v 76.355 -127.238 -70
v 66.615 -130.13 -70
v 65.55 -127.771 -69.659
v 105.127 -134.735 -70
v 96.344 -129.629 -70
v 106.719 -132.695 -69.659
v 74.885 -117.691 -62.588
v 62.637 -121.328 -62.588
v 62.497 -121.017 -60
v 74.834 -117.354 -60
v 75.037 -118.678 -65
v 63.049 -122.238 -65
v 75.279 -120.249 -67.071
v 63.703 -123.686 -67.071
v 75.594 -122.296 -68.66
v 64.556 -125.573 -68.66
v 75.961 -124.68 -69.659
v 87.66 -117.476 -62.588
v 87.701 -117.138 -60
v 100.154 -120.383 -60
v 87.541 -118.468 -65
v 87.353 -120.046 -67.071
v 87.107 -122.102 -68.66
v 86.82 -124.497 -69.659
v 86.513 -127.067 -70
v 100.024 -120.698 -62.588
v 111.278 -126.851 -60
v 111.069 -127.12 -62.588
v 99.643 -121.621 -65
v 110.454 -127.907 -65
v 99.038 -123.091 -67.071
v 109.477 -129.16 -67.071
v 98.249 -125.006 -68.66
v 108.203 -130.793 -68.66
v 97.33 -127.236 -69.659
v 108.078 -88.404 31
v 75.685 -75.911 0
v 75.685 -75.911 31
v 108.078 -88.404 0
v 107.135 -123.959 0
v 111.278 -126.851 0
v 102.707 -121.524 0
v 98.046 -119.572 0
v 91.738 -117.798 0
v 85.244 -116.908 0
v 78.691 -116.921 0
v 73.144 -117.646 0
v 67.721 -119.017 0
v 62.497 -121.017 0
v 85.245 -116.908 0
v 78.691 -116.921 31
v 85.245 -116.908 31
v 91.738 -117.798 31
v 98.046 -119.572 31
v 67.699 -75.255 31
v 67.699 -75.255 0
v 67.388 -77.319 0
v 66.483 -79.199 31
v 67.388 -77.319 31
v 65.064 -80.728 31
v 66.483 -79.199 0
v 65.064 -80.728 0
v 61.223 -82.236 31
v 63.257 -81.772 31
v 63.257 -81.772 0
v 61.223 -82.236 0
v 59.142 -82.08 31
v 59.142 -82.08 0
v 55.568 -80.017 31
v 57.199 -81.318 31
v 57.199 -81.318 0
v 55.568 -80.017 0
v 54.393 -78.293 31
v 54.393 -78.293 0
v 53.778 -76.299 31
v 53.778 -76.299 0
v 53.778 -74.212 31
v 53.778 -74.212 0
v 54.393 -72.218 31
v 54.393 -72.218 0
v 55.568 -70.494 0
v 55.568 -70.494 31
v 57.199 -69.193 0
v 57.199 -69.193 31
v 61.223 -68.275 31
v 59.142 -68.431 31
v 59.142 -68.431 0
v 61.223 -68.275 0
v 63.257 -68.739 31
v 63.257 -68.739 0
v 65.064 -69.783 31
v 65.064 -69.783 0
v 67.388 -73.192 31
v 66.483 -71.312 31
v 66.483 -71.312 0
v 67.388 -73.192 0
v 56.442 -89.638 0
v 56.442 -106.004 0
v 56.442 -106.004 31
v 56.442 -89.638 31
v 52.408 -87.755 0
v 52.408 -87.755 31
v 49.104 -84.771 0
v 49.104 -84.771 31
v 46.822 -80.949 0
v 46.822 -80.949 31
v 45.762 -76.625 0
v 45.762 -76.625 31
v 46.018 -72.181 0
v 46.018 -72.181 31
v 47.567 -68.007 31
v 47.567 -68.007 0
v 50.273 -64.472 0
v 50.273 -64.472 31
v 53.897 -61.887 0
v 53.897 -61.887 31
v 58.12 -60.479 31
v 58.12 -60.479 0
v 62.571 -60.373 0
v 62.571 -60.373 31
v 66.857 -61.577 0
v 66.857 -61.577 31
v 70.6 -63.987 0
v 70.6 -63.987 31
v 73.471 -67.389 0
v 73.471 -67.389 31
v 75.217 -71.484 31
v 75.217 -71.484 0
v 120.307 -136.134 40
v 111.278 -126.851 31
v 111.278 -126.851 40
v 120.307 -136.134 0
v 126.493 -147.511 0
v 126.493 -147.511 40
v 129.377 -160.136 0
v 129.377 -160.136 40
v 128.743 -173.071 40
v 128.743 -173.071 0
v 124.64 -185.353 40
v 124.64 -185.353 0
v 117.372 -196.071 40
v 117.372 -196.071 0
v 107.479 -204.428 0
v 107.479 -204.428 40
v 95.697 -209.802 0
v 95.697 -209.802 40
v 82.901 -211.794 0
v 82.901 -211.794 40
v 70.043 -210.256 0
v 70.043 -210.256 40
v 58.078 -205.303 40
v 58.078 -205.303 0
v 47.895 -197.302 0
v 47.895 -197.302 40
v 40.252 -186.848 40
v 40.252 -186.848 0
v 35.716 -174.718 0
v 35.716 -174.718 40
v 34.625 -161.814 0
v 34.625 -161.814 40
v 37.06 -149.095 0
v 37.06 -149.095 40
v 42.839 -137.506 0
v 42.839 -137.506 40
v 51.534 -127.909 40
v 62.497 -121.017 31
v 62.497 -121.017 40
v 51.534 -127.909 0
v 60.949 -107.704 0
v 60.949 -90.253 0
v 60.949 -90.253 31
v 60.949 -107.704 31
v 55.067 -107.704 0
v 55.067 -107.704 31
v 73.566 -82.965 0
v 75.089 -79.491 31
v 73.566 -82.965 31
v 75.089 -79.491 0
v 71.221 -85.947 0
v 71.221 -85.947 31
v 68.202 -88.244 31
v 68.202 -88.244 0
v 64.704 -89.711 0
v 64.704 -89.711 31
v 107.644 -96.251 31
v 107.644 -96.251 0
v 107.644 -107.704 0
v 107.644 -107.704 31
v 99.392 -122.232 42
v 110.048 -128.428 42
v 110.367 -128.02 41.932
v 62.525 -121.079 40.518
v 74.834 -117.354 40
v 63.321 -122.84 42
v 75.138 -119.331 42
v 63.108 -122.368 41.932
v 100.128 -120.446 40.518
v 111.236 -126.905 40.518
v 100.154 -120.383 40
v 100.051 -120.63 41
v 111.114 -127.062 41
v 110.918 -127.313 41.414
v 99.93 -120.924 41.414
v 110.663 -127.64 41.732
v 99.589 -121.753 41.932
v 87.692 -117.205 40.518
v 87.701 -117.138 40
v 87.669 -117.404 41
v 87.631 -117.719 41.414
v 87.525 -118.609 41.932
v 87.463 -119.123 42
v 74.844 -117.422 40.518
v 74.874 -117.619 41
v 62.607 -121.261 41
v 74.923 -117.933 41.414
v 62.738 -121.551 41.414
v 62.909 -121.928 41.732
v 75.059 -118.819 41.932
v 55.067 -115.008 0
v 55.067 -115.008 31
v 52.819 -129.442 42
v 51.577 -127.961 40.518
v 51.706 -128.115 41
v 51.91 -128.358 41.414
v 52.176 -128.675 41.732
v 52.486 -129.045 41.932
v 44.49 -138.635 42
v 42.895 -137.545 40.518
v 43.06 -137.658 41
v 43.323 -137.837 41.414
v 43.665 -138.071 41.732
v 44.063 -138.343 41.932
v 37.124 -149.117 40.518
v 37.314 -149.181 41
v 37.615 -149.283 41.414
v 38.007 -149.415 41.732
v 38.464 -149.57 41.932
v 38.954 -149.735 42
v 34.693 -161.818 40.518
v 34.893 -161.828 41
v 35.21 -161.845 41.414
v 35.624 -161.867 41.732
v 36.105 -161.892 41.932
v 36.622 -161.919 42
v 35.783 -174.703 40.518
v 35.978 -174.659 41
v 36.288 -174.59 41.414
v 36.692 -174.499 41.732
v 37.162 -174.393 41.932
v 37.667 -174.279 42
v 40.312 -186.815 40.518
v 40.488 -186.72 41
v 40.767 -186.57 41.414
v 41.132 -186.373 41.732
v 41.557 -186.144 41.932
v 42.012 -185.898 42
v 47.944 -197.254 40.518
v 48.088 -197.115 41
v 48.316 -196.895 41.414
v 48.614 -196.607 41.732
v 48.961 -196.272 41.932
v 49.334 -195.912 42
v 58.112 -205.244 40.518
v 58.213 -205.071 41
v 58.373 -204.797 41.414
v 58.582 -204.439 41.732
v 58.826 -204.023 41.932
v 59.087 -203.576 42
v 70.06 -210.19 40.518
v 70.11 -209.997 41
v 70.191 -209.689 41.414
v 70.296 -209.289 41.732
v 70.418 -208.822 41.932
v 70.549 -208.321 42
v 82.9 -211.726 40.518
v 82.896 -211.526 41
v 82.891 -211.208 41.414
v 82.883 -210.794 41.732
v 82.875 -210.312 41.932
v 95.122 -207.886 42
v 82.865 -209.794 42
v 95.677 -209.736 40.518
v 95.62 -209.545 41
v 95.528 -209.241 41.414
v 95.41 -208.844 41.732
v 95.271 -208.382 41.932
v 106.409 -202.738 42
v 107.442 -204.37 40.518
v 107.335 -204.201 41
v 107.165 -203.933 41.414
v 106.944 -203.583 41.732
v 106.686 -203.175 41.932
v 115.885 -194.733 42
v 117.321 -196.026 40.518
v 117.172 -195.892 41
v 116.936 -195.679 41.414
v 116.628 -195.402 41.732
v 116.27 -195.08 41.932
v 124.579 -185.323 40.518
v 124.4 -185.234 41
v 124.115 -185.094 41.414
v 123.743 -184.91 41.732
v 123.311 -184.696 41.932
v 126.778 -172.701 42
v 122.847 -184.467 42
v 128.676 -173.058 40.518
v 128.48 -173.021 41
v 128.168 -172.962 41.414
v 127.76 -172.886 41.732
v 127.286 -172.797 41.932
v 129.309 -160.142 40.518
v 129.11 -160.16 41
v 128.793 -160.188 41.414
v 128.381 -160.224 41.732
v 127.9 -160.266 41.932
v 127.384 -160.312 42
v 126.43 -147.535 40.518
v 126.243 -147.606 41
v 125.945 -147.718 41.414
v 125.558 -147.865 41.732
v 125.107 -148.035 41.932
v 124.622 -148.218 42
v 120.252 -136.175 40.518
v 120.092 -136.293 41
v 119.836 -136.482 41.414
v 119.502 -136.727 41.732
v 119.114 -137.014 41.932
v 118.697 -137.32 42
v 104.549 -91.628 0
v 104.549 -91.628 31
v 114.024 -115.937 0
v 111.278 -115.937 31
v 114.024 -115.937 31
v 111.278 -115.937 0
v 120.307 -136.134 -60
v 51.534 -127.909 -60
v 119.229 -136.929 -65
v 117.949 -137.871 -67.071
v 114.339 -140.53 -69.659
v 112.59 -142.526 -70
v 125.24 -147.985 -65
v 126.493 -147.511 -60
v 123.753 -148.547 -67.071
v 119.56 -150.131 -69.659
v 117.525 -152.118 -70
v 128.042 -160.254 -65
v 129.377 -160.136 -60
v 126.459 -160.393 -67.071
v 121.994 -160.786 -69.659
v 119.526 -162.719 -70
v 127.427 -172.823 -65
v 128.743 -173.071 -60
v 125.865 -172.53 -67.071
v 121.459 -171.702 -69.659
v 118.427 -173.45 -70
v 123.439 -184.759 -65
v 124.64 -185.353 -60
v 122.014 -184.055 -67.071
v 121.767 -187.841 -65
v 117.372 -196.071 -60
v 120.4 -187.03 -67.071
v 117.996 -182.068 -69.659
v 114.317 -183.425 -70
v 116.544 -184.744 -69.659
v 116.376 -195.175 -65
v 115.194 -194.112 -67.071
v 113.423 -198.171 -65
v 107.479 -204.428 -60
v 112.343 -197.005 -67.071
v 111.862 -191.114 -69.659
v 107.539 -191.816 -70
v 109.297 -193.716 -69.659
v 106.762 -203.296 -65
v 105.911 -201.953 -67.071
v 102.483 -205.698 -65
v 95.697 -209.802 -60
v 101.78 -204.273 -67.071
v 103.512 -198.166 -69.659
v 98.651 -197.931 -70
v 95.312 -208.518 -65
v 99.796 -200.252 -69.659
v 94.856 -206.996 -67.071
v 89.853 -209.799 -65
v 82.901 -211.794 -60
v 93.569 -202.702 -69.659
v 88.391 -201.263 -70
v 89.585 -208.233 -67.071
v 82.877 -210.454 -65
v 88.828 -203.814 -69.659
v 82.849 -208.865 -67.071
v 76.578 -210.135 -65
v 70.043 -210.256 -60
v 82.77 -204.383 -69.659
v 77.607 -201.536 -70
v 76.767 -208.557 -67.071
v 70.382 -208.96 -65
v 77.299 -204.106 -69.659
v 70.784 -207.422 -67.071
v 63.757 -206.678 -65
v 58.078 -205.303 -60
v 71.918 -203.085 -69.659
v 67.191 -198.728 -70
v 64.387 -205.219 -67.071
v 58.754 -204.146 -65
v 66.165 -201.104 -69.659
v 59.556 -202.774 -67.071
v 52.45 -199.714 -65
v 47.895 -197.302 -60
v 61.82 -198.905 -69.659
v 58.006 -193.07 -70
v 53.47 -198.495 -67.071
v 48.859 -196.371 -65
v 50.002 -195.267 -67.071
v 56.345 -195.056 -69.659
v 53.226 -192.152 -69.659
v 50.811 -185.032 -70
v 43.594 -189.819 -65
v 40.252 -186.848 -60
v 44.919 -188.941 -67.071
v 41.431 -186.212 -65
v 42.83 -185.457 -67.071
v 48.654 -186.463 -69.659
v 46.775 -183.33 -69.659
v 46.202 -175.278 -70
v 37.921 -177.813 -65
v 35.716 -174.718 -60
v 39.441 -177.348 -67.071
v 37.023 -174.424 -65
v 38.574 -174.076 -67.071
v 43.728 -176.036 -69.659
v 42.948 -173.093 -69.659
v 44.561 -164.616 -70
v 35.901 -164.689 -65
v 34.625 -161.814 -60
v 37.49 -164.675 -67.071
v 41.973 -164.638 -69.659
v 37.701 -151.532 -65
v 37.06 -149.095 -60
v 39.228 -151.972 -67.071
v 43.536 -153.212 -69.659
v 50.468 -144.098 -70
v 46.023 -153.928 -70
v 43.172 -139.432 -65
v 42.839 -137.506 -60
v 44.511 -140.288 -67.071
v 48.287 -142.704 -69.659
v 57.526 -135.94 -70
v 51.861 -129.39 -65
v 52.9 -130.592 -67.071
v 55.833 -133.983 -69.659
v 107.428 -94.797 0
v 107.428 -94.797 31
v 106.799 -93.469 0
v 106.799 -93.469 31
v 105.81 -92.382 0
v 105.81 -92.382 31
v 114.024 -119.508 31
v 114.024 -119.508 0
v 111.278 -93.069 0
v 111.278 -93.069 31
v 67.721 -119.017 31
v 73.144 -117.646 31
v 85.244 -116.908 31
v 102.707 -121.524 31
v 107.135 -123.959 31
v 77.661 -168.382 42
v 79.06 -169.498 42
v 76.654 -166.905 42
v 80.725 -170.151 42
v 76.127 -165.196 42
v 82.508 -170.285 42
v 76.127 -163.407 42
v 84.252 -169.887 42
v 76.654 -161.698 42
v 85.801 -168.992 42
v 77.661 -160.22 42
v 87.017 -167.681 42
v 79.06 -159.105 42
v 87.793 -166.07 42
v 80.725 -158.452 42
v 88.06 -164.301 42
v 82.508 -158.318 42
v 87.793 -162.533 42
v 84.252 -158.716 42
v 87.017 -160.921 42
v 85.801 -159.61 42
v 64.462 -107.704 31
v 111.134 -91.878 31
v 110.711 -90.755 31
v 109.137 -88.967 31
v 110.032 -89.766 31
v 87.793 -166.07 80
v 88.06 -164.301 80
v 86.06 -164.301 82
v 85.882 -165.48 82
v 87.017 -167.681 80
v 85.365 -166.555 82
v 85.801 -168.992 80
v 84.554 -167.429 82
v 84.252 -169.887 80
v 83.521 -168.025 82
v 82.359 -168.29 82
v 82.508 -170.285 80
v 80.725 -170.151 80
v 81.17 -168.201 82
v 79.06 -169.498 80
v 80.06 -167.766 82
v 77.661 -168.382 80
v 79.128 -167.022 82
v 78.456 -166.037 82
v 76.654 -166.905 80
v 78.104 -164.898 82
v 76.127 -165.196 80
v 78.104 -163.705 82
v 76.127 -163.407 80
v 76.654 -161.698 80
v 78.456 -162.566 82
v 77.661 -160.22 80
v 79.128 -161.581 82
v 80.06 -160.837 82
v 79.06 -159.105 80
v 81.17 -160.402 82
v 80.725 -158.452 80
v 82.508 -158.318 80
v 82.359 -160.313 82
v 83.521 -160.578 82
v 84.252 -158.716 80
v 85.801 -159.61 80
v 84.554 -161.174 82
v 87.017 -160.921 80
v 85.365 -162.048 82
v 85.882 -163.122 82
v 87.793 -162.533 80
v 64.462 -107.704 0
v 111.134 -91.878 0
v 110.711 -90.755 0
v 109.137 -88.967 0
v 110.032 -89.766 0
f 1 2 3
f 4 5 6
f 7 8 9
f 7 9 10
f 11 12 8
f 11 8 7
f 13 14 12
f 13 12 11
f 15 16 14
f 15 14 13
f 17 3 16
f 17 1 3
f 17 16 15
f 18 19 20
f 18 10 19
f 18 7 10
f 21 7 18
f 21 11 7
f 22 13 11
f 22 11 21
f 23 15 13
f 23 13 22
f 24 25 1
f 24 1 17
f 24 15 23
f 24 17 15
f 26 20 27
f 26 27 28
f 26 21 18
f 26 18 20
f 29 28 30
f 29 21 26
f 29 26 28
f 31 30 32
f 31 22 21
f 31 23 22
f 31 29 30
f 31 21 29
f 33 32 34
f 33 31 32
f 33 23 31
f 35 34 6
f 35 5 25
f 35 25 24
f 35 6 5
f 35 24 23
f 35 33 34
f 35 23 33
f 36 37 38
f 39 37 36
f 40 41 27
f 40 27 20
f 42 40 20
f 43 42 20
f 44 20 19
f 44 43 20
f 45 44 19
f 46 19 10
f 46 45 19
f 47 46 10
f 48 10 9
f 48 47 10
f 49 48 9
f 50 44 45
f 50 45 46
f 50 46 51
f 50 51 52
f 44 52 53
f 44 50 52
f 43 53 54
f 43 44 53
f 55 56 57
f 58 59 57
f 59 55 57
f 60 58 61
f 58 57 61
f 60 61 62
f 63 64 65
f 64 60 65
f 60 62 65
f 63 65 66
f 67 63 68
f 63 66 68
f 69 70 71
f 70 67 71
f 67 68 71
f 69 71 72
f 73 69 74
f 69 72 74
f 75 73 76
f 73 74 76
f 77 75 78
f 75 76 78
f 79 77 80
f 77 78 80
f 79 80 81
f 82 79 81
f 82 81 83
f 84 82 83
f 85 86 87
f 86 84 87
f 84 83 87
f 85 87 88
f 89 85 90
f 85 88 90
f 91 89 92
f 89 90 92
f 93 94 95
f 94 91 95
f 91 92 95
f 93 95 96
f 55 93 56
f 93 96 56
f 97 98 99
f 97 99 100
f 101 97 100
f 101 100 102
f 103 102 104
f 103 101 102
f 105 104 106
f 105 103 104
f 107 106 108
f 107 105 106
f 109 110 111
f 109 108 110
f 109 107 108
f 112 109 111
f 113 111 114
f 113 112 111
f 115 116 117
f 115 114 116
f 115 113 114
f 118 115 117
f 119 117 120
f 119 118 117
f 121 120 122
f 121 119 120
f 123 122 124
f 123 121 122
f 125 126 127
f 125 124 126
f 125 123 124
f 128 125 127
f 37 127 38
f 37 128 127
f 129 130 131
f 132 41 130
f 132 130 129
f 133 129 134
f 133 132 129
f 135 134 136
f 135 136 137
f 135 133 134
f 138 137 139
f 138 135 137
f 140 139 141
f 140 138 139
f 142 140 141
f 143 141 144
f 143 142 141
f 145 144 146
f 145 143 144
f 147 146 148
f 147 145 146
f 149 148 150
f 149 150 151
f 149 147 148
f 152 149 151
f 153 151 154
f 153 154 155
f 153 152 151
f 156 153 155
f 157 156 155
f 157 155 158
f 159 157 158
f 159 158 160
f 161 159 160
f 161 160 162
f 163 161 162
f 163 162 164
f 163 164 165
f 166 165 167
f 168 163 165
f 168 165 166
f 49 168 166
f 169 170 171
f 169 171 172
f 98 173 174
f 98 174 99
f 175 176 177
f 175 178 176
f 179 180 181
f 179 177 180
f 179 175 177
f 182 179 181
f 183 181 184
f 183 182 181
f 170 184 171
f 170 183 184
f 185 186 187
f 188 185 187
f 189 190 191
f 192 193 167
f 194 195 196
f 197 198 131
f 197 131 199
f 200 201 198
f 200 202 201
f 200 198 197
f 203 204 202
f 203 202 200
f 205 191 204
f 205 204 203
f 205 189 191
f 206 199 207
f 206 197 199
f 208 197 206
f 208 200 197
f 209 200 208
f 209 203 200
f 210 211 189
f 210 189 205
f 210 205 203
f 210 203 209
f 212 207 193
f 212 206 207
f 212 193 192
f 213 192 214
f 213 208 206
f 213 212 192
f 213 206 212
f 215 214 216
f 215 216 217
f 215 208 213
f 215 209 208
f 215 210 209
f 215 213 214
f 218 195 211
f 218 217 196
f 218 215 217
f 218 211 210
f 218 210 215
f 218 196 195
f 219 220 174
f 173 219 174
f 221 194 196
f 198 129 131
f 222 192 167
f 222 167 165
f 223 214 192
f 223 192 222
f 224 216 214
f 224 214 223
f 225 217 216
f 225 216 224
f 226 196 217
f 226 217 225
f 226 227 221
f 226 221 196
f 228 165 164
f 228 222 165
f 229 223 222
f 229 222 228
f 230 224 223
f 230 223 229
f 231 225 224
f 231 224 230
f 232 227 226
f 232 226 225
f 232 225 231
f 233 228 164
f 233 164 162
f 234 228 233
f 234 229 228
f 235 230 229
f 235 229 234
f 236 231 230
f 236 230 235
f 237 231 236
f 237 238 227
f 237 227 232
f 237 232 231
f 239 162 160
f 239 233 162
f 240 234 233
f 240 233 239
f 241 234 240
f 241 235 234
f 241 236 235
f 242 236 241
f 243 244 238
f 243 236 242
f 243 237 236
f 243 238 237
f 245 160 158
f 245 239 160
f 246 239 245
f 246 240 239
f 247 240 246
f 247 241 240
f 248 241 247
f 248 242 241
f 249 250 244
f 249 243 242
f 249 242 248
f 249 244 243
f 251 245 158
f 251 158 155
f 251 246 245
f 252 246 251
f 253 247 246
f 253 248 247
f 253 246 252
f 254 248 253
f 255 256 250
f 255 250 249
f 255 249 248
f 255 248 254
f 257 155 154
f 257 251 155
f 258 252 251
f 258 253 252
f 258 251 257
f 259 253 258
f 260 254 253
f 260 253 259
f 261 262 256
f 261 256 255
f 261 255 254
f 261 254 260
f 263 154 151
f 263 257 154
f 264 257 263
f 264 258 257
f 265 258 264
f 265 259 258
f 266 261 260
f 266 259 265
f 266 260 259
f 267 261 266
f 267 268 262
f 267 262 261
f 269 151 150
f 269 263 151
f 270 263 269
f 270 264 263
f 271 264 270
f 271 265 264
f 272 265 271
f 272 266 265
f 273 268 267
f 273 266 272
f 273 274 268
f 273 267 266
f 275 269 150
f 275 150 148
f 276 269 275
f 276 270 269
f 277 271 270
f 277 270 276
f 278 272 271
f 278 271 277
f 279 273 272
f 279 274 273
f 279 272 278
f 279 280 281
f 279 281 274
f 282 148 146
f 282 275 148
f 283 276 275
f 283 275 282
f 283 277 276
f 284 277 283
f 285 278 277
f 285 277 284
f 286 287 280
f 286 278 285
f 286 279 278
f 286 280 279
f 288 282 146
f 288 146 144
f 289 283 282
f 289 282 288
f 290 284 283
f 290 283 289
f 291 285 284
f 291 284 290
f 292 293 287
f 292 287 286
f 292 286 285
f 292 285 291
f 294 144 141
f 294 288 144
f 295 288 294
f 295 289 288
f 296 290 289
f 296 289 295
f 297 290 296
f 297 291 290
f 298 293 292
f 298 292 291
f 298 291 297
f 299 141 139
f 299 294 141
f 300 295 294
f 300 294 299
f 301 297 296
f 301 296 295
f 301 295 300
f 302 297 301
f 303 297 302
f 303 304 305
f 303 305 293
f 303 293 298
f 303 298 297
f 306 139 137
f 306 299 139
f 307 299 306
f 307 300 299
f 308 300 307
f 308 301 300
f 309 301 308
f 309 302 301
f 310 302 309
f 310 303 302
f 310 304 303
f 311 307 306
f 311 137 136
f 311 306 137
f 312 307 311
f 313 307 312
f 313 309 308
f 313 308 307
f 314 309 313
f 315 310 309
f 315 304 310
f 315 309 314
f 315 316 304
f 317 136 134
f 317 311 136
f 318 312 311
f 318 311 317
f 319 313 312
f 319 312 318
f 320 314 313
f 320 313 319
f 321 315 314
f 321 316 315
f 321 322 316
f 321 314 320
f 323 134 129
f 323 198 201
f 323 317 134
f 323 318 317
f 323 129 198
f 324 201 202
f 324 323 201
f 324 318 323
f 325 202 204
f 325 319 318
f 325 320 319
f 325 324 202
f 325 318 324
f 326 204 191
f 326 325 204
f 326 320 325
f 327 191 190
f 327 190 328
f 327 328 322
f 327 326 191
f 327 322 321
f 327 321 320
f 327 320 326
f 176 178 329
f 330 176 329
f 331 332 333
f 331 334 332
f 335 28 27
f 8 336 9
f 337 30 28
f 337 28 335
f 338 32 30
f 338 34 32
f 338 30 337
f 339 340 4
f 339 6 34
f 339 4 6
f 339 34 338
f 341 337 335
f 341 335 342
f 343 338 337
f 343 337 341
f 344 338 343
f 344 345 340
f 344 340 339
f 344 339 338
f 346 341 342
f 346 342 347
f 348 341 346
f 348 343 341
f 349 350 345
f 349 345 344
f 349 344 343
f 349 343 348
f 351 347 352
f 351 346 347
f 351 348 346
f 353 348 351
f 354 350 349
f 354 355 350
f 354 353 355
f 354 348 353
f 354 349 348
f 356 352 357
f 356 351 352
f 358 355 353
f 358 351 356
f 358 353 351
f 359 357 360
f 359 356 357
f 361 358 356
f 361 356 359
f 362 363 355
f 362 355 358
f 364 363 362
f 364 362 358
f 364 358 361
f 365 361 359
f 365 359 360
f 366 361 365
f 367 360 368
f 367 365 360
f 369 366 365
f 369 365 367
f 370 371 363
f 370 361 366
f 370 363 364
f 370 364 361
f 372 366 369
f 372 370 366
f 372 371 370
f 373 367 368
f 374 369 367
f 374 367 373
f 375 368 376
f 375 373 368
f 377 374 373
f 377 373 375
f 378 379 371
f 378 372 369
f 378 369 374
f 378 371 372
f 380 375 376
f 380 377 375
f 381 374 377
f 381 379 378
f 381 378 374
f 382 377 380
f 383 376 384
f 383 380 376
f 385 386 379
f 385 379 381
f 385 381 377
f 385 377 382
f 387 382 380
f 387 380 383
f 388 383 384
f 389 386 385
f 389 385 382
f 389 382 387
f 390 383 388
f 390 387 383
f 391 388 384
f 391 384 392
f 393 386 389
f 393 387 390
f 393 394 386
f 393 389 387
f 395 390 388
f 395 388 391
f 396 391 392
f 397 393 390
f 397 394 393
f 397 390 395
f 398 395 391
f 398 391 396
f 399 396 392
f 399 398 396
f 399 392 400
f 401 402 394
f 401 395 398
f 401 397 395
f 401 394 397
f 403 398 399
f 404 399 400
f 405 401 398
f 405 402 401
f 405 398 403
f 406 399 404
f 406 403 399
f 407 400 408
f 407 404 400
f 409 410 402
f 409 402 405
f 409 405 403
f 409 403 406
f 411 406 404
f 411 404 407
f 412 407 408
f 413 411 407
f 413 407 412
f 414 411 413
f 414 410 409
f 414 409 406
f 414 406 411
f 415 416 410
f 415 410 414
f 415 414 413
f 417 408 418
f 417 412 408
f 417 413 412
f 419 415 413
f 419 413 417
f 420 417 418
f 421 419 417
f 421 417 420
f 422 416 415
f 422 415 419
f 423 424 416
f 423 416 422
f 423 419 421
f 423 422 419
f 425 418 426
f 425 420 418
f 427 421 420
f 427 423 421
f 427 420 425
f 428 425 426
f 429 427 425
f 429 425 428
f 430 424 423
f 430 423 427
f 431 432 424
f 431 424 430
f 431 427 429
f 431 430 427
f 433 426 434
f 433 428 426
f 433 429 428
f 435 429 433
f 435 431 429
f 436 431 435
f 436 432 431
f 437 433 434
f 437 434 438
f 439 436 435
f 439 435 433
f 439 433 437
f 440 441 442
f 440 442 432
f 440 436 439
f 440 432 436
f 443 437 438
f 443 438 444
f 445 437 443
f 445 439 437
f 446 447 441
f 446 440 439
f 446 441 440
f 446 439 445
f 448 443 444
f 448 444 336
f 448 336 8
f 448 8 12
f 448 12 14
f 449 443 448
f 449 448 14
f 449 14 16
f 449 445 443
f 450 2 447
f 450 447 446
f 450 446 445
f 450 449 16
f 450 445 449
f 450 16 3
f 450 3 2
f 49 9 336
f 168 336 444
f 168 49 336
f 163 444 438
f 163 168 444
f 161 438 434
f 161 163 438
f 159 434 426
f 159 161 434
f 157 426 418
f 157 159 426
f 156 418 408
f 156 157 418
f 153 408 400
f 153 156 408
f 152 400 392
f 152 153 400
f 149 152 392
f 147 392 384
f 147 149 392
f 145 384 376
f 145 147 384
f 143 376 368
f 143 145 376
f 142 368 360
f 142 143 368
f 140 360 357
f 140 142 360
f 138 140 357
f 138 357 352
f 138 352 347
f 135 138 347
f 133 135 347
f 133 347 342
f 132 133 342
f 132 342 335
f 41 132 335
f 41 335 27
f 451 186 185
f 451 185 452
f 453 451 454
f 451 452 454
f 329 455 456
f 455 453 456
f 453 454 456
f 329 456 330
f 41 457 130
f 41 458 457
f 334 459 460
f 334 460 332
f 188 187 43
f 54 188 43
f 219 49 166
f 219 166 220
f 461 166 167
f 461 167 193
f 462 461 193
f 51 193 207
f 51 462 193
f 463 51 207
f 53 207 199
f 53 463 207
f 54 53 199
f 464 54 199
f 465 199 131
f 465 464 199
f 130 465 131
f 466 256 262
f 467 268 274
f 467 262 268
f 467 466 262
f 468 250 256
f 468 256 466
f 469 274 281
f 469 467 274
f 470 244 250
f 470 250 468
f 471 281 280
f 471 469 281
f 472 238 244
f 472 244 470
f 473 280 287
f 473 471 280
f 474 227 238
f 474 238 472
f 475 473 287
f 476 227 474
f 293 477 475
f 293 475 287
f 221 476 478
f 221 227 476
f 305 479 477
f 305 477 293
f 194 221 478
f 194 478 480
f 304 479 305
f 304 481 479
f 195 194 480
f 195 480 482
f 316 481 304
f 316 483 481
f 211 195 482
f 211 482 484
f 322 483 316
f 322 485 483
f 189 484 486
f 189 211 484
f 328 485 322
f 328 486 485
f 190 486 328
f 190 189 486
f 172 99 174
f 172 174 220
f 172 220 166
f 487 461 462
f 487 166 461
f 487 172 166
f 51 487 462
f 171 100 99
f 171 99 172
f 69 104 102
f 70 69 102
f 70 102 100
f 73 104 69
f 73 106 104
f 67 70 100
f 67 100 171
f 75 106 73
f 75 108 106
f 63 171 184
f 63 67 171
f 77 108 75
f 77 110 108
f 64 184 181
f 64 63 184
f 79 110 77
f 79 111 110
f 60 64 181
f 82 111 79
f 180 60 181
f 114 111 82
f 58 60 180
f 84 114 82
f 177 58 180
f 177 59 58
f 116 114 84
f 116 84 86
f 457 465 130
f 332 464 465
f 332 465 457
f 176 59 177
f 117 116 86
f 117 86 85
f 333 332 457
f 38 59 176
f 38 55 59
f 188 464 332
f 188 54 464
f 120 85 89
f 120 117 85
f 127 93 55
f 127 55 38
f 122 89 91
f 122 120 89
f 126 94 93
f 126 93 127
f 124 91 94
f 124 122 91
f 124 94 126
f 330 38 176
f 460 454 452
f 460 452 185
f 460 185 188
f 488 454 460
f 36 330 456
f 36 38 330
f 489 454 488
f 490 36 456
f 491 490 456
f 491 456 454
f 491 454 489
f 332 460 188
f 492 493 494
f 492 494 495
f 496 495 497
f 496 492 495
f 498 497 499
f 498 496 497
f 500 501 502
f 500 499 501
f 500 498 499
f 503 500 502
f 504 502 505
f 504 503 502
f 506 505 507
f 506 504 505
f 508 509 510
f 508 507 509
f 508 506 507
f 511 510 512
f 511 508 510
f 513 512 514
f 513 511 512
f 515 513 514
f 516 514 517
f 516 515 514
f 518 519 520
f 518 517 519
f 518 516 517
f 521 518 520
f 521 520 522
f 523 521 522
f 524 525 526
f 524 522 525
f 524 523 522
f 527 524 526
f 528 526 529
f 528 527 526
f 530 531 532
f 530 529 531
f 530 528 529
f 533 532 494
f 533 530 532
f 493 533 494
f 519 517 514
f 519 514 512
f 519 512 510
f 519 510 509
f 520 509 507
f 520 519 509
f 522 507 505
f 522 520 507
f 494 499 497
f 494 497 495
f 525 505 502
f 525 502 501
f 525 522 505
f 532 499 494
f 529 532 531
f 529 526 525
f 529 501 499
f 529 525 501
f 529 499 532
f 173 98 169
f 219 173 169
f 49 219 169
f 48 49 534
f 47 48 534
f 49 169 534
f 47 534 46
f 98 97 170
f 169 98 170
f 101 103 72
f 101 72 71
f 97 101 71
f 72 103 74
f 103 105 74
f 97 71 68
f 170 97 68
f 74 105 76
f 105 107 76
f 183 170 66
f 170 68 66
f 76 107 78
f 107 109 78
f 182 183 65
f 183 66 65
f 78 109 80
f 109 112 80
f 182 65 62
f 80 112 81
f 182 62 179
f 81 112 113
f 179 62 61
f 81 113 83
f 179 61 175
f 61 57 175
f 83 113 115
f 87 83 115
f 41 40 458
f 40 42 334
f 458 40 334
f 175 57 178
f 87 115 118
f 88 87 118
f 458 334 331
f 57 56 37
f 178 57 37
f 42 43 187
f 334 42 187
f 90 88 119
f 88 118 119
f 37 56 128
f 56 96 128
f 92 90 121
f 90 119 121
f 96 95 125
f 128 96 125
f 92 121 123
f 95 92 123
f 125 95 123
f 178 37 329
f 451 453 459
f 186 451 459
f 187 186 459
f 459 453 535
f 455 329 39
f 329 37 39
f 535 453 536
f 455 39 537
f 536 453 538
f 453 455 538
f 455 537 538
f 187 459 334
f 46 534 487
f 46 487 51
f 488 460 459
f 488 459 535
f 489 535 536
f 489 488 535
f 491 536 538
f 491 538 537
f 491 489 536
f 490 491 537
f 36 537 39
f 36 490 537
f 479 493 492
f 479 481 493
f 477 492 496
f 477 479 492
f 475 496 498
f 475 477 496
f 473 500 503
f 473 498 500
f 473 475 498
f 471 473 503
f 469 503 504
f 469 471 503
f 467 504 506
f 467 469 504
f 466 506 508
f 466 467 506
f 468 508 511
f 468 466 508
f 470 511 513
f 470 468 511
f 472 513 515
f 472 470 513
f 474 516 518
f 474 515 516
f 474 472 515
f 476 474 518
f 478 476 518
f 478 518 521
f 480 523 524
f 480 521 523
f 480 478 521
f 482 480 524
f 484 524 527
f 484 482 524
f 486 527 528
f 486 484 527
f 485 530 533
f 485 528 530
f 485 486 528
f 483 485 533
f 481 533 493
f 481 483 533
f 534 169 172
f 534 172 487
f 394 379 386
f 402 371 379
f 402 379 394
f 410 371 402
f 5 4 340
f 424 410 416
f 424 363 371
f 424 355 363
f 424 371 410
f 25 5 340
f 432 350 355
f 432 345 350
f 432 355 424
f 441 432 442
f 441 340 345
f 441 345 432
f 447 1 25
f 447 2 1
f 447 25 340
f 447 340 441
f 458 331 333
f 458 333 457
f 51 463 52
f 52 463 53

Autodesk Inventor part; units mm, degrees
ref_plane "YZ Plane" through (0, 0, 0) normal (1, 0, 0) x (0, 1, 0)
ref_plane "XZ Plane" through (0, 0, 0) normal (0, 1, 0) x (-1, 0, 0)
ref_plane "XY Plane" through (0, 0, 0) normal (0, 0, 1) x (1, 0, 0)
sketch "Boceto1" plane through (0, 0, 0) normal (0, 0, 1) x (1, 0, 0)
  line L0 (0, 0) -> (176.0622, 0) construction
  line L1 (176.0622, 0) -> (176.0622, -234.7497) construction
  line L2 (176.0622, -234.7497) -> (0, -234.7497) construction
  line L3 (0, -234.7497) -> (0, 0) construction
  circle A0 centre (60.6994, -75.2554) radius 7
  line L4 (60.9494, -90.2533) -> (60.9494, -105.0535)
  line L5 (60.9494, -105.0535) -> (60.9494, -107.7044)
  line L6 (60.9494, -107.7044) -> (64.462, -107.7044)
  line L7 (64.462, -107.7044) -> (78.6909, -116.9211)
  arc A1 (62.497, -121.017) -> (111.2784, -126.8512) centre (82.0598, -164.3014) ccw
  line L8 (75.685, -75.9112) -> (111.2784, -89.6384)
  line L9 (111.2784, -89.6384) -> (111.2784, -91.0916)
  line L10 (111.2784, -91.0916) -> (111.2784, -115.9371)
  line L11 (111.2784, -115.9371) -> (114.0242, -115.9371)
  line L12 (114.0242, -115.9371) -> (114.0242, -119.5079)
  line L13 (114.0242, -119.5079) -> (111.2784, -126.8512)
  line L14 (75.0889, -79.491) -> (107.6439, -92.9034)
  line L15 (107.6439, -92.9034) -> (107.6439, -107.7044)
  line L16 (107.6439, -107.7044) -> (98.0464, -119.5725)
  line L17 (62.497, -121.017) -> (55.0669, -115.0084)
  line L18 (55.0669, -115.0084) -> (55.0669, -107.7044)
  line L19 (55.0669, -107.7044) -> (56.4416, -106.0045)
  line L20 (56.4416, -106.0045) -> (56.4416, -89.6384)
  arc A2 (75.0889, -79.491) -> (75.685, -75.9112) centre (60.6994, -75.2554) ccw construction
  arc A3 (60.9494, -90.2533) -> (75.0889, -79.491) centre (60.6994, -75.2554) ccw
  arc A4 (56.4416, -89.6384) -> (60.9494, -90.2533) centre (60.6994, -75.2554) ccw construction
  arc A5 (75.685, -75.9112) -> (56.4416, -89.6384) centre (60.6994, -75.2554) ccw
  arc A6 (78.6909, -116.9211) -> (62.497, -121.017) centre (82.0598, -164.3014) ccw construction
  arc A7 (111.2784, -126.8512) -> (98.0464, -119.5725) centre (82.0598, -164.3014) ccw construction
  arc A8 (98.0464, -119.5725) -> (78.6909, -116.9211) centre (82.0598, -164.3014) ccw
  dimension "d2" = 14
  dimension "d5" = 95
  dimension "d9" = 30
extrude "Extrusión1" add sketch "Boceto1" along normal blind 31
sketch "Boceto2" plane through (0, 0, 31) normal (0, 0, 1) x (1, 0, 0)
  arc A0 (62.497, -121.017) -> (111.2784, -126.8512) centre (82.0598, -164.3014) ccw projected
  circle A1 centre (82.0598, -164.3014) radius 47.5
  point P0 (0, 0)
  point P1 (62.497, -121.017)
extrude "Extrusión2" add sketch "Boceto2" along normal blind 11
sketch "Boceto3" plane through (0, 0, 0) normal (0, 0, -1) x (-1, 0, 0)
  arc A0 (-111.2784, -126.8512) -> (-62.497, -121.017) centre (-82.0598, -164.3014) ccw projected
  circle A1 centre (-82.0598, -164.3014) radius 47.5
  point P0 (0, 0)
extrude "Extrusión3" add sketch "Boceto3" along normal blind 70
fillet "Empalme1" radius 10 1 edges at (101.6226, -207.5859, -70)
fillet "Empalme2" radius 2 1 edges at (52.8411, -201.7517, 42)
sketch "Boceto4" plane through (82.0598, -164.3014, 42) normal (0, 0, 1) x (1, 0, 0)
  circle A0 centre (0, 0) radius 6
  point P0 (-82.0598, 164.3014)
  dimension "d32" = 12
extrude "Extrusión4" add sketch "Boceto4" along normal blind 40
chamfer "Chaflán1" distance 2 angle 45 1 edges at (76.0598, -164.3014, 82)
fillet "Empalme3" radius 5 2 edges at (111.2784, -89.6384, 15.5) (107.6439, -92.9034, 15.5)
properties part number "motor2"
